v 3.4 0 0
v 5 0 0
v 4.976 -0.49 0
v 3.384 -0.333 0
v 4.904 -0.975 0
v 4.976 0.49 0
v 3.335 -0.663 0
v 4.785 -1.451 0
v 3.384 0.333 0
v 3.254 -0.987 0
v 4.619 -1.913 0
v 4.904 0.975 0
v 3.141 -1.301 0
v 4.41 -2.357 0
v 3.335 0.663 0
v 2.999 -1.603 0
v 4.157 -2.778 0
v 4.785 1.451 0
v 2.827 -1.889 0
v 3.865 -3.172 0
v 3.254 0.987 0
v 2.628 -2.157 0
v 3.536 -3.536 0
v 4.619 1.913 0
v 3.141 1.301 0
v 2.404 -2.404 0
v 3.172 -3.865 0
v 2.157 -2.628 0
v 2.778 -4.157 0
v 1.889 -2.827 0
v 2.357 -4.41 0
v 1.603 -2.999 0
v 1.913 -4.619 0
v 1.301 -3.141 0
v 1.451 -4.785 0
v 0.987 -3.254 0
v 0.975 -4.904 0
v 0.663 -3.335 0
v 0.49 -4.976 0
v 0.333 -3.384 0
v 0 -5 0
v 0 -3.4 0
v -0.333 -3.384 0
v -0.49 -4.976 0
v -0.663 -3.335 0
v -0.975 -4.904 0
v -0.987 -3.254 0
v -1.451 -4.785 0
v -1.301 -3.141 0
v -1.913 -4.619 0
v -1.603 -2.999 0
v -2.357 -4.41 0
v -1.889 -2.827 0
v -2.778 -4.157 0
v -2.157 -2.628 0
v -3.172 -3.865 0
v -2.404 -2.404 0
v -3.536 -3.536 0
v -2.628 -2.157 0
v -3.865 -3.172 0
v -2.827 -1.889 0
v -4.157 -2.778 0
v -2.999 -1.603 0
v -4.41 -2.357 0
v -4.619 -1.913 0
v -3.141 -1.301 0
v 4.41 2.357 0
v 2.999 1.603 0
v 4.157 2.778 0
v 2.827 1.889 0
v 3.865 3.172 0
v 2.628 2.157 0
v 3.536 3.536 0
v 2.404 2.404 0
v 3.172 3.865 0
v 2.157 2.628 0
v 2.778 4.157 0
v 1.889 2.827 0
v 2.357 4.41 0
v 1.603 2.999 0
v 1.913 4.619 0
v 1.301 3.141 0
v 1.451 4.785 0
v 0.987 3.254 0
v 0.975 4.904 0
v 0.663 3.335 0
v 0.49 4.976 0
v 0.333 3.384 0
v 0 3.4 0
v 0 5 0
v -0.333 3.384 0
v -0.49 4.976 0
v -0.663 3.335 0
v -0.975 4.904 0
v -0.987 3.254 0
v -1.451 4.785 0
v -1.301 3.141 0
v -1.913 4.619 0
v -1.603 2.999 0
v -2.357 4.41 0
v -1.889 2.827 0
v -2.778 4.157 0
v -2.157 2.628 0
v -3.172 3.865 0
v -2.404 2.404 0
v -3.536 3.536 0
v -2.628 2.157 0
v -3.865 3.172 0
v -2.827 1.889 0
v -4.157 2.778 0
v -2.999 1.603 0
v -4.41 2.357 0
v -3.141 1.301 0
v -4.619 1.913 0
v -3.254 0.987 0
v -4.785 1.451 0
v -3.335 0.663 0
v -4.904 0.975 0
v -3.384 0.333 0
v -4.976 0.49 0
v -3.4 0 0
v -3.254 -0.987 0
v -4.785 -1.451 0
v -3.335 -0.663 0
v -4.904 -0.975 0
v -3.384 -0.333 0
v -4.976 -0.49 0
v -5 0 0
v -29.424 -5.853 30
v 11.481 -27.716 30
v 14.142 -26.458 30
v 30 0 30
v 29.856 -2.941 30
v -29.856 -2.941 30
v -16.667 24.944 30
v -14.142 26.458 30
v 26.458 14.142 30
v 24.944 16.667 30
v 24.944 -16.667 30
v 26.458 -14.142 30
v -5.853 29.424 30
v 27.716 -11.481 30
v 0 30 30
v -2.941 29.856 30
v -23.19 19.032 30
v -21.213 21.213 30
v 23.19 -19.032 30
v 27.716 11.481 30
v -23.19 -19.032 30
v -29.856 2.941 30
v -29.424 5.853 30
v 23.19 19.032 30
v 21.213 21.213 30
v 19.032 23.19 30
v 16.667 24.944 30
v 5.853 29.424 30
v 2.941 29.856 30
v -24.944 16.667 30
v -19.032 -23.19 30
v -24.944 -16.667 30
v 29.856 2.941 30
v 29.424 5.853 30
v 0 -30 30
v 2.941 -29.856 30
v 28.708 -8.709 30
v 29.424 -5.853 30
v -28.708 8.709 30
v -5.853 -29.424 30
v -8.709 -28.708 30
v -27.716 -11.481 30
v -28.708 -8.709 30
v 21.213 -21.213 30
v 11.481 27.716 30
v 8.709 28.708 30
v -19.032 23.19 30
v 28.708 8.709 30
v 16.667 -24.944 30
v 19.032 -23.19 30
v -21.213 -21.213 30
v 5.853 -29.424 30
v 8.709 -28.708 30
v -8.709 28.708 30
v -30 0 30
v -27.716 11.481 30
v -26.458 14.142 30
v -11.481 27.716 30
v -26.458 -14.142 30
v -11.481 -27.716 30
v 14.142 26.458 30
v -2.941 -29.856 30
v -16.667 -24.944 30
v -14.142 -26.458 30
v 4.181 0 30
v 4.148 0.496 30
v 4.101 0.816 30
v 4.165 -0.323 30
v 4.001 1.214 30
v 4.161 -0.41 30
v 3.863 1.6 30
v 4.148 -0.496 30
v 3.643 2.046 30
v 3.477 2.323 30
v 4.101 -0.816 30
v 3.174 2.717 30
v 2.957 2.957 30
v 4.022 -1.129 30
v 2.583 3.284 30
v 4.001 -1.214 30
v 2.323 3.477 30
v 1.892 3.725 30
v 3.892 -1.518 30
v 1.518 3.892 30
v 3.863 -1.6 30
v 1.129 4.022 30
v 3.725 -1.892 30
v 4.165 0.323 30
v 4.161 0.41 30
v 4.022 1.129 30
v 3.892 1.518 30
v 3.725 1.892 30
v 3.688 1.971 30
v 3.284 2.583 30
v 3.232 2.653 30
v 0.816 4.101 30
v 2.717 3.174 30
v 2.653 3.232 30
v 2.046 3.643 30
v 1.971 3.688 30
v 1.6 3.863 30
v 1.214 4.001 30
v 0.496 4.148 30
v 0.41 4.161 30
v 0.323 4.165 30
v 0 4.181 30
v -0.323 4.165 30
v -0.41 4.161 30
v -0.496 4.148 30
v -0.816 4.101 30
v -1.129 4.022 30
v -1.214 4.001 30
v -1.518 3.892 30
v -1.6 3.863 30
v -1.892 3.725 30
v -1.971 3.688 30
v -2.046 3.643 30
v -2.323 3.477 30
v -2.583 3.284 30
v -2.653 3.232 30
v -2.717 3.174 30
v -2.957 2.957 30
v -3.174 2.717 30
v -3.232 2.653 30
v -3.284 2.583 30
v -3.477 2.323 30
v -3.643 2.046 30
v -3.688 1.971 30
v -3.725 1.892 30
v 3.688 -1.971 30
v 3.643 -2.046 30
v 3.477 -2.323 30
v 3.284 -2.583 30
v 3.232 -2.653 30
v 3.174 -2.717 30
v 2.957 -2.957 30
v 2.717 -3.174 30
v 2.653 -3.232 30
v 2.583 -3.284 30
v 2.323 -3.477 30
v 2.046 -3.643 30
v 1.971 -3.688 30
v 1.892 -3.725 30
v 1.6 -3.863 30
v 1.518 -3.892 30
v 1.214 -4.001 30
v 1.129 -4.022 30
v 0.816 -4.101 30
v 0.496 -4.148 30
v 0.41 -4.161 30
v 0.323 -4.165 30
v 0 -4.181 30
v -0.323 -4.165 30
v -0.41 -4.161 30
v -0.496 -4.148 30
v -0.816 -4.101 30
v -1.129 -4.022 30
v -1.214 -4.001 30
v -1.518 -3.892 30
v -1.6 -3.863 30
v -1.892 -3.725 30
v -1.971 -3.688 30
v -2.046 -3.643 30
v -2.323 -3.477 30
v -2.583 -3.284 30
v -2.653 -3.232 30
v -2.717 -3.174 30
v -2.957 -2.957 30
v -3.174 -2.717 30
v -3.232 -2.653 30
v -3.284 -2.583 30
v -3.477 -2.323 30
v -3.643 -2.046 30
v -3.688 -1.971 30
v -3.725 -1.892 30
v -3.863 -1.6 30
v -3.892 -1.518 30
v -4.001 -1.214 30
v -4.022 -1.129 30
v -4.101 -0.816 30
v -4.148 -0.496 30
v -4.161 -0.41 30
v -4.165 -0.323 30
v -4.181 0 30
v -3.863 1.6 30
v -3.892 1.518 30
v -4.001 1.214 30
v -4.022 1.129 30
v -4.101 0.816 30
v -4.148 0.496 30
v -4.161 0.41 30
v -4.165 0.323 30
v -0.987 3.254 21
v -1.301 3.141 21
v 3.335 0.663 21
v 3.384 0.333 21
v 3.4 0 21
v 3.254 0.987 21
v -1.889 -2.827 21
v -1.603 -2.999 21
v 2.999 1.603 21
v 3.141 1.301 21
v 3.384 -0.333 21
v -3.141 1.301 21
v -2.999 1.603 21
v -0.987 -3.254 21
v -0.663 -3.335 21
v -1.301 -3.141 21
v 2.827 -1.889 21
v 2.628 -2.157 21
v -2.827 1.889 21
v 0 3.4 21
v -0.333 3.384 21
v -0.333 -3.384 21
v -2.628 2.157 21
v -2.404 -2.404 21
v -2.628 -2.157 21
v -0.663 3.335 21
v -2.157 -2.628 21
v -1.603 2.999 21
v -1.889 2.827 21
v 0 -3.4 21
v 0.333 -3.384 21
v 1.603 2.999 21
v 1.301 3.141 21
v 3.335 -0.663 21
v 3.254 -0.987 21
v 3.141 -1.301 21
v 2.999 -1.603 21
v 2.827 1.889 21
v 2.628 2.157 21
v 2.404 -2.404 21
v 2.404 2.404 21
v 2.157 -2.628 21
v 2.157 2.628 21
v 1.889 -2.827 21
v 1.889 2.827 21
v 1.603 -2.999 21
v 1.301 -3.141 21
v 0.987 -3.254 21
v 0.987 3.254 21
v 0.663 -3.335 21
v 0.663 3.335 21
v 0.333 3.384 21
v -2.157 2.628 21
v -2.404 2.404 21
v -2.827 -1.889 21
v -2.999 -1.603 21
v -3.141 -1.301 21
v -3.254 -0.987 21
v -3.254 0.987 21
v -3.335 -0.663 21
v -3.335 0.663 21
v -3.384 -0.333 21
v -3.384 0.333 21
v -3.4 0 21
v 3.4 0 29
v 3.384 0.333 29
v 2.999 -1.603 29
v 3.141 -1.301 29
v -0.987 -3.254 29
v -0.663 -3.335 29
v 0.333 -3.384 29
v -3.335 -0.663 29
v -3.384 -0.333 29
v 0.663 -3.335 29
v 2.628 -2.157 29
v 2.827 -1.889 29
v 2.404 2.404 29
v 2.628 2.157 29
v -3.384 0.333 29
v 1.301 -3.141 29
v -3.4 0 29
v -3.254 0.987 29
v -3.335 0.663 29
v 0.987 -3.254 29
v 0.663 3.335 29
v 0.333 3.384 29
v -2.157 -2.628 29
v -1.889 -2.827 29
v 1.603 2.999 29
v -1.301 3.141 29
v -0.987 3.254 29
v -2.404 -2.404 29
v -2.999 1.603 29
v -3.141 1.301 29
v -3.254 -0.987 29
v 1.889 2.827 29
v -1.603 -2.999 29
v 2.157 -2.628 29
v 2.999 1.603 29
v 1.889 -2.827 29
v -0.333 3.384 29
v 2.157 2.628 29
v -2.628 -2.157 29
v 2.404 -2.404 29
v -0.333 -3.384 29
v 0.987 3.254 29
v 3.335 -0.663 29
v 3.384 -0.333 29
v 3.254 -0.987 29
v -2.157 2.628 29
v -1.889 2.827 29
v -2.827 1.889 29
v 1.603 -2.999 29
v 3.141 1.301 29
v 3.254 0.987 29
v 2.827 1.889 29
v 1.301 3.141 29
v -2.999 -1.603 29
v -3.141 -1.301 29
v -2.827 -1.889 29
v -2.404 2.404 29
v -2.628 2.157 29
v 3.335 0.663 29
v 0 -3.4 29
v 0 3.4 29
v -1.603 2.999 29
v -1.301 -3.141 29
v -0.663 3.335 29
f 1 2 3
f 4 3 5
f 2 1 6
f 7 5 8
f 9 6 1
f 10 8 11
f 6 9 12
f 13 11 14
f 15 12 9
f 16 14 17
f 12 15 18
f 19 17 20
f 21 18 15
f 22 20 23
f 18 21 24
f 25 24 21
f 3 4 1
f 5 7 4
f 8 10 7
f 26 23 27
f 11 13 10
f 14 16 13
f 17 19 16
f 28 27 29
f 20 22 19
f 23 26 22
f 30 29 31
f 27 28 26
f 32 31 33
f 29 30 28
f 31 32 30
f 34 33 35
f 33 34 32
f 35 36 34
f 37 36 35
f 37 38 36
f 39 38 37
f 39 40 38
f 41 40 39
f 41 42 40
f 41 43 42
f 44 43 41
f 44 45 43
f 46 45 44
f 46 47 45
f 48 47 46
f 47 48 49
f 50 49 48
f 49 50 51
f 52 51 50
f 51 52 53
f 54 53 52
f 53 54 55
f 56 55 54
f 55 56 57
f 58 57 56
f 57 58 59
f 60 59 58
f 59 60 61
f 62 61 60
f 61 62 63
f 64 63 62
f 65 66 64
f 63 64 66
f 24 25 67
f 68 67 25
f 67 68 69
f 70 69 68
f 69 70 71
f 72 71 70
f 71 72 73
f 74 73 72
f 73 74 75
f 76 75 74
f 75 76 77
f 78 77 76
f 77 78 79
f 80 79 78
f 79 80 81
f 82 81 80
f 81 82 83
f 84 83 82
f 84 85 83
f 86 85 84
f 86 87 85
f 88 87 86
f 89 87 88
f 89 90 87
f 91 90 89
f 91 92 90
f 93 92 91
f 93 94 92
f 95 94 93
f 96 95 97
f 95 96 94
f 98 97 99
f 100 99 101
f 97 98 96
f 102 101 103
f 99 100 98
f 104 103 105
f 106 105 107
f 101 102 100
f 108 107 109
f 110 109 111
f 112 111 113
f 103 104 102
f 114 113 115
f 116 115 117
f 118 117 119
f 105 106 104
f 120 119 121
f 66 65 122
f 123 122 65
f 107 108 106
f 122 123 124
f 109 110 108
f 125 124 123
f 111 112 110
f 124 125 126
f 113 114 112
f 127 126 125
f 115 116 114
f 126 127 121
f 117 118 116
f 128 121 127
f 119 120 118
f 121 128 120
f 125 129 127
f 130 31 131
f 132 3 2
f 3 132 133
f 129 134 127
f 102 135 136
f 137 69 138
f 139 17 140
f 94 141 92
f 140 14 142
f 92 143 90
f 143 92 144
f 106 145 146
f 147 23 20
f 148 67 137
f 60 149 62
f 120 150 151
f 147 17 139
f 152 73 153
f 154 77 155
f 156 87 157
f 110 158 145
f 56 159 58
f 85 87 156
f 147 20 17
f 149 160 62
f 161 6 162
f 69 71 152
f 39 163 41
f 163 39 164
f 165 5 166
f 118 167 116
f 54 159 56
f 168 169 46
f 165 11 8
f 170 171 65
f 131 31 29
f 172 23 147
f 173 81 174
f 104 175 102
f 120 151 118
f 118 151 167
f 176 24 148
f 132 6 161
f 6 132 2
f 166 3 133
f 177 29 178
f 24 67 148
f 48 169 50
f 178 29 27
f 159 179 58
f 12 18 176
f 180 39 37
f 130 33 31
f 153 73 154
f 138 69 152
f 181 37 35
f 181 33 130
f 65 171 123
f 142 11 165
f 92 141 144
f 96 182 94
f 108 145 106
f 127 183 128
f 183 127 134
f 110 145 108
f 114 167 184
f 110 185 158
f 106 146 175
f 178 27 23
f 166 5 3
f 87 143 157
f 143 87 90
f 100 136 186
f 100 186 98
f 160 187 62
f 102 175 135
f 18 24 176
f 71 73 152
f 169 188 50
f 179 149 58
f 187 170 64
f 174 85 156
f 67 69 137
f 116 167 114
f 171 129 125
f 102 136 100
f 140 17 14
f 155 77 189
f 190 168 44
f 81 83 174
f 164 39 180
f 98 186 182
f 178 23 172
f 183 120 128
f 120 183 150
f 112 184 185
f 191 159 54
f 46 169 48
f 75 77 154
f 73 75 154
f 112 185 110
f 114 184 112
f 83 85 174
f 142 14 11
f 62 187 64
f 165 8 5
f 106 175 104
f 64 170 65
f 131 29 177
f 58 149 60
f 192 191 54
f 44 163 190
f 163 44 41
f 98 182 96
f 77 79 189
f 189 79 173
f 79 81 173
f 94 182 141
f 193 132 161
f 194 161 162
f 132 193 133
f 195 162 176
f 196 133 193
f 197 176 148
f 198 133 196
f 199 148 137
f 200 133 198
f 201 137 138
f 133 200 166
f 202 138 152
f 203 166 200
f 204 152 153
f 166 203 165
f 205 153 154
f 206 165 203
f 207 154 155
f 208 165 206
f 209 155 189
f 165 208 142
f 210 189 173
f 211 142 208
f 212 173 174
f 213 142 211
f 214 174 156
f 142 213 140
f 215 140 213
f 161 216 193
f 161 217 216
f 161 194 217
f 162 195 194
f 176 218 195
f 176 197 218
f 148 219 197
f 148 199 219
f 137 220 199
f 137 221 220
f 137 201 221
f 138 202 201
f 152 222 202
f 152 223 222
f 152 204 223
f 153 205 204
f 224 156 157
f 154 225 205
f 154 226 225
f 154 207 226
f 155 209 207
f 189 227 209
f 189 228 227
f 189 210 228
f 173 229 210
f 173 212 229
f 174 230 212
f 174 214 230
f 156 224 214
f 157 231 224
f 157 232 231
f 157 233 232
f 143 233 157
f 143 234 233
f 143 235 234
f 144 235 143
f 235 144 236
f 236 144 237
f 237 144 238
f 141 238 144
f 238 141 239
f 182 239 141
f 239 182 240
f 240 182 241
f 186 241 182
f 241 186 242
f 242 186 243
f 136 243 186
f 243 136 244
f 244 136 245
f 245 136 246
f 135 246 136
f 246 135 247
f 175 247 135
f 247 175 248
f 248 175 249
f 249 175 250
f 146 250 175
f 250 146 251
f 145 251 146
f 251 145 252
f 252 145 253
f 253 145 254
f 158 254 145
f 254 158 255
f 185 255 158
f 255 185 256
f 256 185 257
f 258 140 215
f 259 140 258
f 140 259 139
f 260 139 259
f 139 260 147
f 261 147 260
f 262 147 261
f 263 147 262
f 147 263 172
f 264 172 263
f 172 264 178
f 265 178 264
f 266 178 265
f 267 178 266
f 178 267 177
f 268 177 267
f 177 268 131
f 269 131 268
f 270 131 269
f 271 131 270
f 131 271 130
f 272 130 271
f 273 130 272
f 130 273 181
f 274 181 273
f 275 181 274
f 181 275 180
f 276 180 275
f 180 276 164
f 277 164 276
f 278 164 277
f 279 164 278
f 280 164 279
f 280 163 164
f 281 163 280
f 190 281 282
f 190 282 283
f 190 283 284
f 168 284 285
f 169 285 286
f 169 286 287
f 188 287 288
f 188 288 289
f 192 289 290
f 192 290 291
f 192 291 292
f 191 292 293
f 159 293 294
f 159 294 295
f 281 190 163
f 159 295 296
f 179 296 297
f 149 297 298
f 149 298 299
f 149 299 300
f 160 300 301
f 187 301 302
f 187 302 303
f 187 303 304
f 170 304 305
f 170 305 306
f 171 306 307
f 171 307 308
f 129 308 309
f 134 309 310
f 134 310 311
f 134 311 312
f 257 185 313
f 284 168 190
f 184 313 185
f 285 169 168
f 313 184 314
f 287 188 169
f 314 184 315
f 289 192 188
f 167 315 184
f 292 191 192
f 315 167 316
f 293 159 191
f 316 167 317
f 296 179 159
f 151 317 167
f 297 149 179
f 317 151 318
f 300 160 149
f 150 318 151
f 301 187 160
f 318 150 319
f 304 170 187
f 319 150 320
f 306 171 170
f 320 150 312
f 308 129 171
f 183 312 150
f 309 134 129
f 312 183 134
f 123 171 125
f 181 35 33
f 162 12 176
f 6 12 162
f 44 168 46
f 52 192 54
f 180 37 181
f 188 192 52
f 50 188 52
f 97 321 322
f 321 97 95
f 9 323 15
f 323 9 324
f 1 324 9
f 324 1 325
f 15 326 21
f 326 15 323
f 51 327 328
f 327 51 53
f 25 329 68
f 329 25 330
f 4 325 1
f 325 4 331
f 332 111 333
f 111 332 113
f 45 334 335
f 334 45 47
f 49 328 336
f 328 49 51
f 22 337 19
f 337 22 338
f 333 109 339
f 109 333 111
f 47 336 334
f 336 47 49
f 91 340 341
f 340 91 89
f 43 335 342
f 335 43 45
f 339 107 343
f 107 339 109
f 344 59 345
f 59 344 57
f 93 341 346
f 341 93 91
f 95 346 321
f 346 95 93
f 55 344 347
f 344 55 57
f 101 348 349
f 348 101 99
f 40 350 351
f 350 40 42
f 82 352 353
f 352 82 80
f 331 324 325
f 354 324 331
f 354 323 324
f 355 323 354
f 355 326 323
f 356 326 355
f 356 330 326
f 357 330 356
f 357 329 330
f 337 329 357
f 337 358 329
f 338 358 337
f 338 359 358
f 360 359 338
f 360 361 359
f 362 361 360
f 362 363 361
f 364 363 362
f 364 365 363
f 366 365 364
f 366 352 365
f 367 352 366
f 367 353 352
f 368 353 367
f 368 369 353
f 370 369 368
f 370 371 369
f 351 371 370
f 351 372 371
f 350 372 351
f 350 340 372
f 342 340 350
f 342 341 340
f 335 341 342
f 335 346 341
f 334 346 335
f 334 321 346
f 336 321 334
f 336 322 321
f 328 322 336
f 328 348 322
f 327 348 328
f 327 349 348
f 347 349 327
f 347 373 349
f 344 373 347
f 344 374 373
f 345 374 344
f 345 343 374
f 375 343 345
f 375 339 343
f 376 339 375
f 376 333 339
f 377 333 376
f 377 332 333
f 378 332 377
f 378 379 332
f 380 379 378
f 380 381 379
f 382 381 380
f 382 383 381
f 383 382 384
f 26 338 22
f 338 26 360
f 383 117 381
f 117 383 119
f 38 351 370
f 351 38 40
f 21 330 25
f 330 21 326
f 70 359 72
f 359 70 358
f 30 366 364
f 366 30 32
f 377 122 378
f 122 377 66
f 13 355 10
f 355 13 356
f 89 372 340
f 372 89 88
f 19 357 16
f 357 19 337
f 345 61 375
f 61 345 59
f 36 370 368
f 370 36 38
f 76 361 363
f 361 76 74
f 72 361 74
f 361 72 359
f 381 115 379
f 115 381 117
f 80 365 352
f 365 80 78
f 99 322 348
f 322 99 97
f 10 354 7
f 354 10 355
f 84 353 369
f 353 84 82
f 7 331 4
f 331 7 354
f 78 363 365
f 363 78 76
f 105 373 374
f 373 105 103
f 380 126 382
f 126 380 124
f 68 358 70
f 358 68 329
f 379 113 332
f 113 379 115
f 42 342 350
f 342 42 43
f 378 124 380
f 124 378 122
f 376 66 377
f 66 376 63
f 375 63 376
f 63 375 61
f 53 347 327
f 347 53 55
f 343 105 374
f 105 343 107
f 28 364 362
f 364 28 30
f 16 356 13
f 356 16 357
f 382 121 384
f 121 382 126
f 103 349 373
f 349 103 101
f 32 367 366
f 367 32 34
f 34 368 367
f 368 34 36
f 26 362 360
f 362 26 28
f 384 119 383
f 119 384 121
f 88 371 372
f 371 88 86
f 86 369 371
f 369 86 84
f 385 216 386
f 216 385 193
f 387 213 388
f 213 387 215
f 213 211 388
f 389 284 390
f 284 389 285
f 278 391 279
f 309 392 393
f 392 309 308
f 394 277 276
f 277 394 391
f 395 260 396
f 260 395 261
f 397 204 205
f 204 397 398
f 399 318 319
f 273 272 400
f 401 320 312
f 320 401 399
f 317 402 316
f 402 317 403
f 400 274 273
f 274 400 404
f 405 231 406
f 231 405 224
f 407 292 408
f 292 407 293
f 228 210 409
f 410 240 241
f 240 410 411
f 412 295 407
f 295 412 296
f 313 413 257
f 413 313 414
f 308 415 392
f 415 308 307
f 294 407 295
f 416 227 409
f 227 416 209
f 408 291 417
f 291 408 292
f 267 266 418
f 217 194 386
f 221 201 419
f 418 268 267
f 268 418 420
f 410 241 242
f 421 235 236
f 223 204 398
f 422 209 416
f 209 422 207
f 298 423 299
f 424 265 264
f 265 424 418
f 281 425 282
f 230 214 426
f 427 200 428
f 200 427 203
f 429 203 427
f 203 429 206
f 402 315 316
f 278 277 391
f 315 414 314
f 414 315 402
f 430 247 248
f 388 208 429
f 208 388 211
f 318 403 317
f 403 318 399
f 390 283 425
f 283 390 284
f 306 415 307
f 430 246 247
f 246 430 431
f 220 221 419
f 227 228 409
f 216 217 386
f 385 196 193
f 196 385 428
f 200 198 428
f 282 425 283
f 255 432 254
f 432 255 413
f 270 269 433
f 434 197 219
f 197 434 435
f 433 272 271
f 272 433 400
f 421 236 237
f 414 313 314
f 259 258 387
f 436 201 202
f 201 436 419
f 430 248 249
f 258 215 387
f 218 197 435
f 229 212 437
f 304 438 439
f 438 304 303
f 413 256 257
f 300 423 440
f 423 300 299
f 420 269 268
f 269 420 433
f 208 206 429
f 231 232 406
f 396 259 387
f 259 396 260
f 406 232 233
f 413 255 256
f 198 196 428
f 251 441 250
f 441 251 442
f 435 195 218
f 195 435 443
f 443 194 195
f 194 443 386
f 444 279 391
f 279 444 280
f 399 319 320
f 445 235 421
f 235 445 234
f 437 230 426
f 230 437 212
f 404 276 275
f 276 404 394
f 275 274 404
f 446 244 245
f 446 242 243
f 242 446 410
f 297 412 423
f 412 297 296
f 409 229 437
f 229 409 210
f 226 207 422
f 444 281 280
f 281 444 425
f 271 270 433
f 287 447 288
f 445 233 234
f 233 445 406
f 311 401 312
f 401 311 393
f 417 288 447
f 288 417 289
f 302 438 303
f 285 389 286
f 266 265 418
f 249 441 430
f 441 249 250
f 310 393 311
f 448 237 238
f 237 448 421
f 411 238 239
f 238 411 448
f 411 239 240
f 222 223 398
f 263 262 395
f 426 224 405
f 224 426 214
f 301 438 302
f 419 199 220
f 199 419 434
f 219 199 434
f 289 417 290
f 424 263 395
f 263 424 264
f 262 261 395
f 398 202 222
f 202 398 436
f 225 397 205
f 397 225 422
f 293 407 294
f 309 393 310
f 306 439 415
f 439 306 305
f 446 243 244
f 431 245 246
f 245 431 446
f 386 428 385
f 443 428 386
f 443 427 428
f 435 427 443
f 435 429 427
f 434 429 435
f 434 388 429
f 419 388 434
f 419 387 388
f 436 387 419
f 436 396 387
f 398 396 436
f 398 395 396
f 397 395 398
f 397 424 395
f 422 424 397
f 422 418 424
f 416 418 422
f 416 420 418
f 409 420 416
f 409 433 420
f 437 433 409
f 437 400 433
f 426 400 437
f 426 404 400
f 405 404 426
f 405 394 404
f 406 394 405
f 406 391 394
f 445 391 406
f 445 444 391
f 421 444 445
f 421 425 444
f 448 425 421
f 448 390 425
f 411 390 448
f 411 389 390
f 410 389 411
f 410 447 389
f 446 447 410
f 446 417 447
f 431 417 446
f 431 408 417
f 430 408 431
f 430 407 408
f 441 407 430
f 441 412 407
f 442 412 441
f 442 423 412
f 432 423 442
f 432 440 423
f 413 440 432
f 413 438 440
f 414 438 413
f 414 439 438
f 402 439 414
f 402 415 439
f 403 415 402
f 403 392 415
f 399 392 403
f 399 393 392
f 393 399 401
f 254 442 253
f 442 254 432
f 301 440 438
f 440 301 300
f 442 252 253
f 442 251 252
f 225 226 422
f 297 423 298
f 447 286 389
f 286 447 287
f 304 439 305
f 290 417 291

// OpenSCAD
// Funnel - a straight spout topped by a conical section, open at both ends for fluid flow.
// NOVEL general part (a generic funnel, not any one labware item).
//

spout_d = 10;
spout_l = 20;
cone_d1 = 10;
cone_d2 = 60;
cone_h  = 30;
wall    = 1.6;

$fn = 64;

ib = max(1.6, spout_d - 2 * wall);   // bore: keep at least 1.6 mm even if the spout gets very narrow

difference() {
    union() {
        cylinder(h = spout_l, d = spout_d);
        cylinder(h = cone_h, d1 = cone_d1, d2 = cone_d2);
    }
    translate([0, 0, -1]) cylinder(h = spout_l + 2, d = ib);   // bore through the spout
    translate([0, 0, cone_h - 1]) cylinder(h = cone_h + 2, d1 = ib, d2 = cone_d2 - 2 * wall);  // conical bore, open at the rim
}
